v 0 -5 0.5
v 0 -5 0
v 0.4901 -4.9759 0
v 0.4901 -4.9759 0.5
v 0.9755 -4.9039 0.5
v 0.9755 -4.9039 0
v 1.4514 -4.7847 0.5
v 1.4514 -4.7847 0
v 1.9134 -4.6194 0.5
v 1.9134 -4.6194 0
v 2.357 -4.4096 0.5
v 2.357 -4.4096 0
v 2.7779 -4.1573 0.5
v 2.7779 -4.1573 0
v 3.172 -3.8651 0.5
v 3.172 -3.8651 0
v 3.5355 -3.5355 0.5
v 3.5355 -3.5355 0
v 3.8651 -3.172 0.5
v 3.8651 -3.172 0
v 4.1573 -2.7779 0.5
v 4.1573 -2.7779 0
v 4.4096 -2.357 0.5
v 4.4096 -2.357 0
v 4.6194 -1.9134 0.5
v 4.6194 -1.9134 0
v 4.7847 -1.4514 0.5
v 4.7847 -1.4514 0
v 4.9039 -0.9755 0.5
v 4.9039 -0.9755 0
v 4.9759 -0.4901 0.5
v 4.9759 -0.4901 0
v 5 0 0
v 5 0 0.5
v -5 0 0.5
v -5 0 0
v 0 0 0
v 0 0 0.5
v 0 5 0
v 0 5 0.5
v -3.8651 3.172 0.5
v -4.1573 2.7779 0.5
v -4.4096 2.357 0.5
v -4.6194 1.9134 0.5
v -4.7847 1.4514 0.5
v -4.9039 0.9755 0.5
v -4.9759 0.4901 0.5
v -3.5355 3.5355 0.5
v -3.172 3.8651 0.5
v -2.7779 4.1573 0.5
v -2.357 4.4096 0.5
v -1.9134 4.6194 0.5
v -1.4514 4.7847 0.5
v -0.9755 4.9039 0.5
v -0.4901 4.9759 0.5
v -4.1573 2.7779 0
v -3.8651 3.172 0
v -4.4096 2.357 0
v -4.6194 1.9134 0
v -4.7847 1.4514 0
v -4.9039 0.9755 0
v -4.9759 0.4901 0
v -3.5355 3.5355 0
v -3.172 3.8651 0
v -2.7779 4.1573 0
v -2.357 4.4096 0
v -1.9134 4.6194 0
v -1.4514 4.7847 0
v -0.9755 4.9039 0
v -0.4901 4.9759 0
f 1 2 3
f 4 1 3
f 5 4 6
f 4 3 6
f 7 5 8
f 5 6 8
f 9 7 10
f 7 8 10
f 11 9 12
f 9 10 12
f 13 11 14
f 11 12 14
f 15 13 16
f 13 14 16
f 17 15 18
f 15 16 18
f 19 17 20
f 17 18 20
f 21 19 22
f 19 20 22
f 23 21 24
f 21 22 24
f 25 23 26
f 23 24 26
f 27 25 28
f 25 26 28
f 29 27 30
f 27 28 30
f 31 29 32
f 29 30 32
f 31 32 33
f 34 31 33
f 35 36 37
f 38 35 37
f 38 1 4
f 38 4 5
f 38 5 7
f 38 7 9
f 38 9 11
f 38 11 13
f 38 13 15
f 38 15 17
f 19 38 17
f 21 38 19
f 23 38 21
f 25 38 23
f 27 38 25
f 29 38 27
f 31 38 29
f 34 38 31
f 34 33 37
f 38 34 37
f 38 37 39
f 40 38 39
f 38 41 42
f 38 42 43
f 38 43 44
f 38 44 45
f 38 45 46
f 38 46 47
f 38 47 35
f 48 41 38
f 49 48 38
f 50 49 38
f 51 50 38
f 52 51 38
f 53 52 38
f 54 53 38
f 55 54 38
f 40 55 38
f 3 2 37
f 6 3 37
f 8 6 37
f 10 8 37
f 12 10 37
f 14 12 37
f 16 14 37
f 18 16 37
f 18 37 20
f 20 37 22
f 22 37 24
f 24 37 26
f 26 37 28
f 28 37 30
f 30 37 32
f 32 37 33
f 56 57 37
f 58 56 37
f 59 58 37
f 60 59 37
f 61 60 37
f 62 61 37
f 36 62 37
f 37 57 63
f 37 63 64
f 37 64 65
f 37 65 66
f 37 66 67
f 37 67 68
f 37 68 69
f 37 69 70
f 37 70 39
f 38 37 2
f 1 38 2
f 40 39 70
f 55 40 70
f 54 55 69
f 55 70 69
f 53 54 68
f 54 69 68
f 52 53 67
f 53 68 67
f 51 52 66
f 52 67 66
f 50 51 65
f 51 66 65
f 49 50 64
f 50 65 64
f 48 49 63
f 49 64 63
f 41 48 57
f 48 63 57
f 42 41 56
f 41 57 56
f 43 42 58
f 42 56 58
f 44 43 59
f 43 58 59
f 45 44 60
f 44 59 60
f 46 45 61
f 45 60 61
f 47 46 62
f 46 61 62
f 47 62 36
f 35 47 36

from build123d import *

# Parameters (mm, degrees)
F1_DEPTH = 0.5


with BuildPart() as f1:
    # F0 (on Top) → F1 (new body)
    with BuildSketch(Plane.XY):
        with BuildLine():
            Line((0, 0), (0, 5))
            ThreePointArc((0, 5), (-3.5355339059, 3.5355339059), (-5, 0))
            Line((-5, 0), (0, 0))
        make_face()
    extrude(amount=F1_DEPTH)


with BuildPart() as f1b:
    # F0 (on Top) → F1, piece 2 (new body)
    with BuildSketch(Plane.XY):
        with BuildLine():
            ThreePointArc((0, -5), (3.5355339059, -3.5355339059), (5, 0))
            Line((5, 0), (0, 0))
            Line((0, 0), (0, -5))
        make_face()
    extrude(amount=F1_DEPTH)


solid = Compound([f1.part, f1b.part])
